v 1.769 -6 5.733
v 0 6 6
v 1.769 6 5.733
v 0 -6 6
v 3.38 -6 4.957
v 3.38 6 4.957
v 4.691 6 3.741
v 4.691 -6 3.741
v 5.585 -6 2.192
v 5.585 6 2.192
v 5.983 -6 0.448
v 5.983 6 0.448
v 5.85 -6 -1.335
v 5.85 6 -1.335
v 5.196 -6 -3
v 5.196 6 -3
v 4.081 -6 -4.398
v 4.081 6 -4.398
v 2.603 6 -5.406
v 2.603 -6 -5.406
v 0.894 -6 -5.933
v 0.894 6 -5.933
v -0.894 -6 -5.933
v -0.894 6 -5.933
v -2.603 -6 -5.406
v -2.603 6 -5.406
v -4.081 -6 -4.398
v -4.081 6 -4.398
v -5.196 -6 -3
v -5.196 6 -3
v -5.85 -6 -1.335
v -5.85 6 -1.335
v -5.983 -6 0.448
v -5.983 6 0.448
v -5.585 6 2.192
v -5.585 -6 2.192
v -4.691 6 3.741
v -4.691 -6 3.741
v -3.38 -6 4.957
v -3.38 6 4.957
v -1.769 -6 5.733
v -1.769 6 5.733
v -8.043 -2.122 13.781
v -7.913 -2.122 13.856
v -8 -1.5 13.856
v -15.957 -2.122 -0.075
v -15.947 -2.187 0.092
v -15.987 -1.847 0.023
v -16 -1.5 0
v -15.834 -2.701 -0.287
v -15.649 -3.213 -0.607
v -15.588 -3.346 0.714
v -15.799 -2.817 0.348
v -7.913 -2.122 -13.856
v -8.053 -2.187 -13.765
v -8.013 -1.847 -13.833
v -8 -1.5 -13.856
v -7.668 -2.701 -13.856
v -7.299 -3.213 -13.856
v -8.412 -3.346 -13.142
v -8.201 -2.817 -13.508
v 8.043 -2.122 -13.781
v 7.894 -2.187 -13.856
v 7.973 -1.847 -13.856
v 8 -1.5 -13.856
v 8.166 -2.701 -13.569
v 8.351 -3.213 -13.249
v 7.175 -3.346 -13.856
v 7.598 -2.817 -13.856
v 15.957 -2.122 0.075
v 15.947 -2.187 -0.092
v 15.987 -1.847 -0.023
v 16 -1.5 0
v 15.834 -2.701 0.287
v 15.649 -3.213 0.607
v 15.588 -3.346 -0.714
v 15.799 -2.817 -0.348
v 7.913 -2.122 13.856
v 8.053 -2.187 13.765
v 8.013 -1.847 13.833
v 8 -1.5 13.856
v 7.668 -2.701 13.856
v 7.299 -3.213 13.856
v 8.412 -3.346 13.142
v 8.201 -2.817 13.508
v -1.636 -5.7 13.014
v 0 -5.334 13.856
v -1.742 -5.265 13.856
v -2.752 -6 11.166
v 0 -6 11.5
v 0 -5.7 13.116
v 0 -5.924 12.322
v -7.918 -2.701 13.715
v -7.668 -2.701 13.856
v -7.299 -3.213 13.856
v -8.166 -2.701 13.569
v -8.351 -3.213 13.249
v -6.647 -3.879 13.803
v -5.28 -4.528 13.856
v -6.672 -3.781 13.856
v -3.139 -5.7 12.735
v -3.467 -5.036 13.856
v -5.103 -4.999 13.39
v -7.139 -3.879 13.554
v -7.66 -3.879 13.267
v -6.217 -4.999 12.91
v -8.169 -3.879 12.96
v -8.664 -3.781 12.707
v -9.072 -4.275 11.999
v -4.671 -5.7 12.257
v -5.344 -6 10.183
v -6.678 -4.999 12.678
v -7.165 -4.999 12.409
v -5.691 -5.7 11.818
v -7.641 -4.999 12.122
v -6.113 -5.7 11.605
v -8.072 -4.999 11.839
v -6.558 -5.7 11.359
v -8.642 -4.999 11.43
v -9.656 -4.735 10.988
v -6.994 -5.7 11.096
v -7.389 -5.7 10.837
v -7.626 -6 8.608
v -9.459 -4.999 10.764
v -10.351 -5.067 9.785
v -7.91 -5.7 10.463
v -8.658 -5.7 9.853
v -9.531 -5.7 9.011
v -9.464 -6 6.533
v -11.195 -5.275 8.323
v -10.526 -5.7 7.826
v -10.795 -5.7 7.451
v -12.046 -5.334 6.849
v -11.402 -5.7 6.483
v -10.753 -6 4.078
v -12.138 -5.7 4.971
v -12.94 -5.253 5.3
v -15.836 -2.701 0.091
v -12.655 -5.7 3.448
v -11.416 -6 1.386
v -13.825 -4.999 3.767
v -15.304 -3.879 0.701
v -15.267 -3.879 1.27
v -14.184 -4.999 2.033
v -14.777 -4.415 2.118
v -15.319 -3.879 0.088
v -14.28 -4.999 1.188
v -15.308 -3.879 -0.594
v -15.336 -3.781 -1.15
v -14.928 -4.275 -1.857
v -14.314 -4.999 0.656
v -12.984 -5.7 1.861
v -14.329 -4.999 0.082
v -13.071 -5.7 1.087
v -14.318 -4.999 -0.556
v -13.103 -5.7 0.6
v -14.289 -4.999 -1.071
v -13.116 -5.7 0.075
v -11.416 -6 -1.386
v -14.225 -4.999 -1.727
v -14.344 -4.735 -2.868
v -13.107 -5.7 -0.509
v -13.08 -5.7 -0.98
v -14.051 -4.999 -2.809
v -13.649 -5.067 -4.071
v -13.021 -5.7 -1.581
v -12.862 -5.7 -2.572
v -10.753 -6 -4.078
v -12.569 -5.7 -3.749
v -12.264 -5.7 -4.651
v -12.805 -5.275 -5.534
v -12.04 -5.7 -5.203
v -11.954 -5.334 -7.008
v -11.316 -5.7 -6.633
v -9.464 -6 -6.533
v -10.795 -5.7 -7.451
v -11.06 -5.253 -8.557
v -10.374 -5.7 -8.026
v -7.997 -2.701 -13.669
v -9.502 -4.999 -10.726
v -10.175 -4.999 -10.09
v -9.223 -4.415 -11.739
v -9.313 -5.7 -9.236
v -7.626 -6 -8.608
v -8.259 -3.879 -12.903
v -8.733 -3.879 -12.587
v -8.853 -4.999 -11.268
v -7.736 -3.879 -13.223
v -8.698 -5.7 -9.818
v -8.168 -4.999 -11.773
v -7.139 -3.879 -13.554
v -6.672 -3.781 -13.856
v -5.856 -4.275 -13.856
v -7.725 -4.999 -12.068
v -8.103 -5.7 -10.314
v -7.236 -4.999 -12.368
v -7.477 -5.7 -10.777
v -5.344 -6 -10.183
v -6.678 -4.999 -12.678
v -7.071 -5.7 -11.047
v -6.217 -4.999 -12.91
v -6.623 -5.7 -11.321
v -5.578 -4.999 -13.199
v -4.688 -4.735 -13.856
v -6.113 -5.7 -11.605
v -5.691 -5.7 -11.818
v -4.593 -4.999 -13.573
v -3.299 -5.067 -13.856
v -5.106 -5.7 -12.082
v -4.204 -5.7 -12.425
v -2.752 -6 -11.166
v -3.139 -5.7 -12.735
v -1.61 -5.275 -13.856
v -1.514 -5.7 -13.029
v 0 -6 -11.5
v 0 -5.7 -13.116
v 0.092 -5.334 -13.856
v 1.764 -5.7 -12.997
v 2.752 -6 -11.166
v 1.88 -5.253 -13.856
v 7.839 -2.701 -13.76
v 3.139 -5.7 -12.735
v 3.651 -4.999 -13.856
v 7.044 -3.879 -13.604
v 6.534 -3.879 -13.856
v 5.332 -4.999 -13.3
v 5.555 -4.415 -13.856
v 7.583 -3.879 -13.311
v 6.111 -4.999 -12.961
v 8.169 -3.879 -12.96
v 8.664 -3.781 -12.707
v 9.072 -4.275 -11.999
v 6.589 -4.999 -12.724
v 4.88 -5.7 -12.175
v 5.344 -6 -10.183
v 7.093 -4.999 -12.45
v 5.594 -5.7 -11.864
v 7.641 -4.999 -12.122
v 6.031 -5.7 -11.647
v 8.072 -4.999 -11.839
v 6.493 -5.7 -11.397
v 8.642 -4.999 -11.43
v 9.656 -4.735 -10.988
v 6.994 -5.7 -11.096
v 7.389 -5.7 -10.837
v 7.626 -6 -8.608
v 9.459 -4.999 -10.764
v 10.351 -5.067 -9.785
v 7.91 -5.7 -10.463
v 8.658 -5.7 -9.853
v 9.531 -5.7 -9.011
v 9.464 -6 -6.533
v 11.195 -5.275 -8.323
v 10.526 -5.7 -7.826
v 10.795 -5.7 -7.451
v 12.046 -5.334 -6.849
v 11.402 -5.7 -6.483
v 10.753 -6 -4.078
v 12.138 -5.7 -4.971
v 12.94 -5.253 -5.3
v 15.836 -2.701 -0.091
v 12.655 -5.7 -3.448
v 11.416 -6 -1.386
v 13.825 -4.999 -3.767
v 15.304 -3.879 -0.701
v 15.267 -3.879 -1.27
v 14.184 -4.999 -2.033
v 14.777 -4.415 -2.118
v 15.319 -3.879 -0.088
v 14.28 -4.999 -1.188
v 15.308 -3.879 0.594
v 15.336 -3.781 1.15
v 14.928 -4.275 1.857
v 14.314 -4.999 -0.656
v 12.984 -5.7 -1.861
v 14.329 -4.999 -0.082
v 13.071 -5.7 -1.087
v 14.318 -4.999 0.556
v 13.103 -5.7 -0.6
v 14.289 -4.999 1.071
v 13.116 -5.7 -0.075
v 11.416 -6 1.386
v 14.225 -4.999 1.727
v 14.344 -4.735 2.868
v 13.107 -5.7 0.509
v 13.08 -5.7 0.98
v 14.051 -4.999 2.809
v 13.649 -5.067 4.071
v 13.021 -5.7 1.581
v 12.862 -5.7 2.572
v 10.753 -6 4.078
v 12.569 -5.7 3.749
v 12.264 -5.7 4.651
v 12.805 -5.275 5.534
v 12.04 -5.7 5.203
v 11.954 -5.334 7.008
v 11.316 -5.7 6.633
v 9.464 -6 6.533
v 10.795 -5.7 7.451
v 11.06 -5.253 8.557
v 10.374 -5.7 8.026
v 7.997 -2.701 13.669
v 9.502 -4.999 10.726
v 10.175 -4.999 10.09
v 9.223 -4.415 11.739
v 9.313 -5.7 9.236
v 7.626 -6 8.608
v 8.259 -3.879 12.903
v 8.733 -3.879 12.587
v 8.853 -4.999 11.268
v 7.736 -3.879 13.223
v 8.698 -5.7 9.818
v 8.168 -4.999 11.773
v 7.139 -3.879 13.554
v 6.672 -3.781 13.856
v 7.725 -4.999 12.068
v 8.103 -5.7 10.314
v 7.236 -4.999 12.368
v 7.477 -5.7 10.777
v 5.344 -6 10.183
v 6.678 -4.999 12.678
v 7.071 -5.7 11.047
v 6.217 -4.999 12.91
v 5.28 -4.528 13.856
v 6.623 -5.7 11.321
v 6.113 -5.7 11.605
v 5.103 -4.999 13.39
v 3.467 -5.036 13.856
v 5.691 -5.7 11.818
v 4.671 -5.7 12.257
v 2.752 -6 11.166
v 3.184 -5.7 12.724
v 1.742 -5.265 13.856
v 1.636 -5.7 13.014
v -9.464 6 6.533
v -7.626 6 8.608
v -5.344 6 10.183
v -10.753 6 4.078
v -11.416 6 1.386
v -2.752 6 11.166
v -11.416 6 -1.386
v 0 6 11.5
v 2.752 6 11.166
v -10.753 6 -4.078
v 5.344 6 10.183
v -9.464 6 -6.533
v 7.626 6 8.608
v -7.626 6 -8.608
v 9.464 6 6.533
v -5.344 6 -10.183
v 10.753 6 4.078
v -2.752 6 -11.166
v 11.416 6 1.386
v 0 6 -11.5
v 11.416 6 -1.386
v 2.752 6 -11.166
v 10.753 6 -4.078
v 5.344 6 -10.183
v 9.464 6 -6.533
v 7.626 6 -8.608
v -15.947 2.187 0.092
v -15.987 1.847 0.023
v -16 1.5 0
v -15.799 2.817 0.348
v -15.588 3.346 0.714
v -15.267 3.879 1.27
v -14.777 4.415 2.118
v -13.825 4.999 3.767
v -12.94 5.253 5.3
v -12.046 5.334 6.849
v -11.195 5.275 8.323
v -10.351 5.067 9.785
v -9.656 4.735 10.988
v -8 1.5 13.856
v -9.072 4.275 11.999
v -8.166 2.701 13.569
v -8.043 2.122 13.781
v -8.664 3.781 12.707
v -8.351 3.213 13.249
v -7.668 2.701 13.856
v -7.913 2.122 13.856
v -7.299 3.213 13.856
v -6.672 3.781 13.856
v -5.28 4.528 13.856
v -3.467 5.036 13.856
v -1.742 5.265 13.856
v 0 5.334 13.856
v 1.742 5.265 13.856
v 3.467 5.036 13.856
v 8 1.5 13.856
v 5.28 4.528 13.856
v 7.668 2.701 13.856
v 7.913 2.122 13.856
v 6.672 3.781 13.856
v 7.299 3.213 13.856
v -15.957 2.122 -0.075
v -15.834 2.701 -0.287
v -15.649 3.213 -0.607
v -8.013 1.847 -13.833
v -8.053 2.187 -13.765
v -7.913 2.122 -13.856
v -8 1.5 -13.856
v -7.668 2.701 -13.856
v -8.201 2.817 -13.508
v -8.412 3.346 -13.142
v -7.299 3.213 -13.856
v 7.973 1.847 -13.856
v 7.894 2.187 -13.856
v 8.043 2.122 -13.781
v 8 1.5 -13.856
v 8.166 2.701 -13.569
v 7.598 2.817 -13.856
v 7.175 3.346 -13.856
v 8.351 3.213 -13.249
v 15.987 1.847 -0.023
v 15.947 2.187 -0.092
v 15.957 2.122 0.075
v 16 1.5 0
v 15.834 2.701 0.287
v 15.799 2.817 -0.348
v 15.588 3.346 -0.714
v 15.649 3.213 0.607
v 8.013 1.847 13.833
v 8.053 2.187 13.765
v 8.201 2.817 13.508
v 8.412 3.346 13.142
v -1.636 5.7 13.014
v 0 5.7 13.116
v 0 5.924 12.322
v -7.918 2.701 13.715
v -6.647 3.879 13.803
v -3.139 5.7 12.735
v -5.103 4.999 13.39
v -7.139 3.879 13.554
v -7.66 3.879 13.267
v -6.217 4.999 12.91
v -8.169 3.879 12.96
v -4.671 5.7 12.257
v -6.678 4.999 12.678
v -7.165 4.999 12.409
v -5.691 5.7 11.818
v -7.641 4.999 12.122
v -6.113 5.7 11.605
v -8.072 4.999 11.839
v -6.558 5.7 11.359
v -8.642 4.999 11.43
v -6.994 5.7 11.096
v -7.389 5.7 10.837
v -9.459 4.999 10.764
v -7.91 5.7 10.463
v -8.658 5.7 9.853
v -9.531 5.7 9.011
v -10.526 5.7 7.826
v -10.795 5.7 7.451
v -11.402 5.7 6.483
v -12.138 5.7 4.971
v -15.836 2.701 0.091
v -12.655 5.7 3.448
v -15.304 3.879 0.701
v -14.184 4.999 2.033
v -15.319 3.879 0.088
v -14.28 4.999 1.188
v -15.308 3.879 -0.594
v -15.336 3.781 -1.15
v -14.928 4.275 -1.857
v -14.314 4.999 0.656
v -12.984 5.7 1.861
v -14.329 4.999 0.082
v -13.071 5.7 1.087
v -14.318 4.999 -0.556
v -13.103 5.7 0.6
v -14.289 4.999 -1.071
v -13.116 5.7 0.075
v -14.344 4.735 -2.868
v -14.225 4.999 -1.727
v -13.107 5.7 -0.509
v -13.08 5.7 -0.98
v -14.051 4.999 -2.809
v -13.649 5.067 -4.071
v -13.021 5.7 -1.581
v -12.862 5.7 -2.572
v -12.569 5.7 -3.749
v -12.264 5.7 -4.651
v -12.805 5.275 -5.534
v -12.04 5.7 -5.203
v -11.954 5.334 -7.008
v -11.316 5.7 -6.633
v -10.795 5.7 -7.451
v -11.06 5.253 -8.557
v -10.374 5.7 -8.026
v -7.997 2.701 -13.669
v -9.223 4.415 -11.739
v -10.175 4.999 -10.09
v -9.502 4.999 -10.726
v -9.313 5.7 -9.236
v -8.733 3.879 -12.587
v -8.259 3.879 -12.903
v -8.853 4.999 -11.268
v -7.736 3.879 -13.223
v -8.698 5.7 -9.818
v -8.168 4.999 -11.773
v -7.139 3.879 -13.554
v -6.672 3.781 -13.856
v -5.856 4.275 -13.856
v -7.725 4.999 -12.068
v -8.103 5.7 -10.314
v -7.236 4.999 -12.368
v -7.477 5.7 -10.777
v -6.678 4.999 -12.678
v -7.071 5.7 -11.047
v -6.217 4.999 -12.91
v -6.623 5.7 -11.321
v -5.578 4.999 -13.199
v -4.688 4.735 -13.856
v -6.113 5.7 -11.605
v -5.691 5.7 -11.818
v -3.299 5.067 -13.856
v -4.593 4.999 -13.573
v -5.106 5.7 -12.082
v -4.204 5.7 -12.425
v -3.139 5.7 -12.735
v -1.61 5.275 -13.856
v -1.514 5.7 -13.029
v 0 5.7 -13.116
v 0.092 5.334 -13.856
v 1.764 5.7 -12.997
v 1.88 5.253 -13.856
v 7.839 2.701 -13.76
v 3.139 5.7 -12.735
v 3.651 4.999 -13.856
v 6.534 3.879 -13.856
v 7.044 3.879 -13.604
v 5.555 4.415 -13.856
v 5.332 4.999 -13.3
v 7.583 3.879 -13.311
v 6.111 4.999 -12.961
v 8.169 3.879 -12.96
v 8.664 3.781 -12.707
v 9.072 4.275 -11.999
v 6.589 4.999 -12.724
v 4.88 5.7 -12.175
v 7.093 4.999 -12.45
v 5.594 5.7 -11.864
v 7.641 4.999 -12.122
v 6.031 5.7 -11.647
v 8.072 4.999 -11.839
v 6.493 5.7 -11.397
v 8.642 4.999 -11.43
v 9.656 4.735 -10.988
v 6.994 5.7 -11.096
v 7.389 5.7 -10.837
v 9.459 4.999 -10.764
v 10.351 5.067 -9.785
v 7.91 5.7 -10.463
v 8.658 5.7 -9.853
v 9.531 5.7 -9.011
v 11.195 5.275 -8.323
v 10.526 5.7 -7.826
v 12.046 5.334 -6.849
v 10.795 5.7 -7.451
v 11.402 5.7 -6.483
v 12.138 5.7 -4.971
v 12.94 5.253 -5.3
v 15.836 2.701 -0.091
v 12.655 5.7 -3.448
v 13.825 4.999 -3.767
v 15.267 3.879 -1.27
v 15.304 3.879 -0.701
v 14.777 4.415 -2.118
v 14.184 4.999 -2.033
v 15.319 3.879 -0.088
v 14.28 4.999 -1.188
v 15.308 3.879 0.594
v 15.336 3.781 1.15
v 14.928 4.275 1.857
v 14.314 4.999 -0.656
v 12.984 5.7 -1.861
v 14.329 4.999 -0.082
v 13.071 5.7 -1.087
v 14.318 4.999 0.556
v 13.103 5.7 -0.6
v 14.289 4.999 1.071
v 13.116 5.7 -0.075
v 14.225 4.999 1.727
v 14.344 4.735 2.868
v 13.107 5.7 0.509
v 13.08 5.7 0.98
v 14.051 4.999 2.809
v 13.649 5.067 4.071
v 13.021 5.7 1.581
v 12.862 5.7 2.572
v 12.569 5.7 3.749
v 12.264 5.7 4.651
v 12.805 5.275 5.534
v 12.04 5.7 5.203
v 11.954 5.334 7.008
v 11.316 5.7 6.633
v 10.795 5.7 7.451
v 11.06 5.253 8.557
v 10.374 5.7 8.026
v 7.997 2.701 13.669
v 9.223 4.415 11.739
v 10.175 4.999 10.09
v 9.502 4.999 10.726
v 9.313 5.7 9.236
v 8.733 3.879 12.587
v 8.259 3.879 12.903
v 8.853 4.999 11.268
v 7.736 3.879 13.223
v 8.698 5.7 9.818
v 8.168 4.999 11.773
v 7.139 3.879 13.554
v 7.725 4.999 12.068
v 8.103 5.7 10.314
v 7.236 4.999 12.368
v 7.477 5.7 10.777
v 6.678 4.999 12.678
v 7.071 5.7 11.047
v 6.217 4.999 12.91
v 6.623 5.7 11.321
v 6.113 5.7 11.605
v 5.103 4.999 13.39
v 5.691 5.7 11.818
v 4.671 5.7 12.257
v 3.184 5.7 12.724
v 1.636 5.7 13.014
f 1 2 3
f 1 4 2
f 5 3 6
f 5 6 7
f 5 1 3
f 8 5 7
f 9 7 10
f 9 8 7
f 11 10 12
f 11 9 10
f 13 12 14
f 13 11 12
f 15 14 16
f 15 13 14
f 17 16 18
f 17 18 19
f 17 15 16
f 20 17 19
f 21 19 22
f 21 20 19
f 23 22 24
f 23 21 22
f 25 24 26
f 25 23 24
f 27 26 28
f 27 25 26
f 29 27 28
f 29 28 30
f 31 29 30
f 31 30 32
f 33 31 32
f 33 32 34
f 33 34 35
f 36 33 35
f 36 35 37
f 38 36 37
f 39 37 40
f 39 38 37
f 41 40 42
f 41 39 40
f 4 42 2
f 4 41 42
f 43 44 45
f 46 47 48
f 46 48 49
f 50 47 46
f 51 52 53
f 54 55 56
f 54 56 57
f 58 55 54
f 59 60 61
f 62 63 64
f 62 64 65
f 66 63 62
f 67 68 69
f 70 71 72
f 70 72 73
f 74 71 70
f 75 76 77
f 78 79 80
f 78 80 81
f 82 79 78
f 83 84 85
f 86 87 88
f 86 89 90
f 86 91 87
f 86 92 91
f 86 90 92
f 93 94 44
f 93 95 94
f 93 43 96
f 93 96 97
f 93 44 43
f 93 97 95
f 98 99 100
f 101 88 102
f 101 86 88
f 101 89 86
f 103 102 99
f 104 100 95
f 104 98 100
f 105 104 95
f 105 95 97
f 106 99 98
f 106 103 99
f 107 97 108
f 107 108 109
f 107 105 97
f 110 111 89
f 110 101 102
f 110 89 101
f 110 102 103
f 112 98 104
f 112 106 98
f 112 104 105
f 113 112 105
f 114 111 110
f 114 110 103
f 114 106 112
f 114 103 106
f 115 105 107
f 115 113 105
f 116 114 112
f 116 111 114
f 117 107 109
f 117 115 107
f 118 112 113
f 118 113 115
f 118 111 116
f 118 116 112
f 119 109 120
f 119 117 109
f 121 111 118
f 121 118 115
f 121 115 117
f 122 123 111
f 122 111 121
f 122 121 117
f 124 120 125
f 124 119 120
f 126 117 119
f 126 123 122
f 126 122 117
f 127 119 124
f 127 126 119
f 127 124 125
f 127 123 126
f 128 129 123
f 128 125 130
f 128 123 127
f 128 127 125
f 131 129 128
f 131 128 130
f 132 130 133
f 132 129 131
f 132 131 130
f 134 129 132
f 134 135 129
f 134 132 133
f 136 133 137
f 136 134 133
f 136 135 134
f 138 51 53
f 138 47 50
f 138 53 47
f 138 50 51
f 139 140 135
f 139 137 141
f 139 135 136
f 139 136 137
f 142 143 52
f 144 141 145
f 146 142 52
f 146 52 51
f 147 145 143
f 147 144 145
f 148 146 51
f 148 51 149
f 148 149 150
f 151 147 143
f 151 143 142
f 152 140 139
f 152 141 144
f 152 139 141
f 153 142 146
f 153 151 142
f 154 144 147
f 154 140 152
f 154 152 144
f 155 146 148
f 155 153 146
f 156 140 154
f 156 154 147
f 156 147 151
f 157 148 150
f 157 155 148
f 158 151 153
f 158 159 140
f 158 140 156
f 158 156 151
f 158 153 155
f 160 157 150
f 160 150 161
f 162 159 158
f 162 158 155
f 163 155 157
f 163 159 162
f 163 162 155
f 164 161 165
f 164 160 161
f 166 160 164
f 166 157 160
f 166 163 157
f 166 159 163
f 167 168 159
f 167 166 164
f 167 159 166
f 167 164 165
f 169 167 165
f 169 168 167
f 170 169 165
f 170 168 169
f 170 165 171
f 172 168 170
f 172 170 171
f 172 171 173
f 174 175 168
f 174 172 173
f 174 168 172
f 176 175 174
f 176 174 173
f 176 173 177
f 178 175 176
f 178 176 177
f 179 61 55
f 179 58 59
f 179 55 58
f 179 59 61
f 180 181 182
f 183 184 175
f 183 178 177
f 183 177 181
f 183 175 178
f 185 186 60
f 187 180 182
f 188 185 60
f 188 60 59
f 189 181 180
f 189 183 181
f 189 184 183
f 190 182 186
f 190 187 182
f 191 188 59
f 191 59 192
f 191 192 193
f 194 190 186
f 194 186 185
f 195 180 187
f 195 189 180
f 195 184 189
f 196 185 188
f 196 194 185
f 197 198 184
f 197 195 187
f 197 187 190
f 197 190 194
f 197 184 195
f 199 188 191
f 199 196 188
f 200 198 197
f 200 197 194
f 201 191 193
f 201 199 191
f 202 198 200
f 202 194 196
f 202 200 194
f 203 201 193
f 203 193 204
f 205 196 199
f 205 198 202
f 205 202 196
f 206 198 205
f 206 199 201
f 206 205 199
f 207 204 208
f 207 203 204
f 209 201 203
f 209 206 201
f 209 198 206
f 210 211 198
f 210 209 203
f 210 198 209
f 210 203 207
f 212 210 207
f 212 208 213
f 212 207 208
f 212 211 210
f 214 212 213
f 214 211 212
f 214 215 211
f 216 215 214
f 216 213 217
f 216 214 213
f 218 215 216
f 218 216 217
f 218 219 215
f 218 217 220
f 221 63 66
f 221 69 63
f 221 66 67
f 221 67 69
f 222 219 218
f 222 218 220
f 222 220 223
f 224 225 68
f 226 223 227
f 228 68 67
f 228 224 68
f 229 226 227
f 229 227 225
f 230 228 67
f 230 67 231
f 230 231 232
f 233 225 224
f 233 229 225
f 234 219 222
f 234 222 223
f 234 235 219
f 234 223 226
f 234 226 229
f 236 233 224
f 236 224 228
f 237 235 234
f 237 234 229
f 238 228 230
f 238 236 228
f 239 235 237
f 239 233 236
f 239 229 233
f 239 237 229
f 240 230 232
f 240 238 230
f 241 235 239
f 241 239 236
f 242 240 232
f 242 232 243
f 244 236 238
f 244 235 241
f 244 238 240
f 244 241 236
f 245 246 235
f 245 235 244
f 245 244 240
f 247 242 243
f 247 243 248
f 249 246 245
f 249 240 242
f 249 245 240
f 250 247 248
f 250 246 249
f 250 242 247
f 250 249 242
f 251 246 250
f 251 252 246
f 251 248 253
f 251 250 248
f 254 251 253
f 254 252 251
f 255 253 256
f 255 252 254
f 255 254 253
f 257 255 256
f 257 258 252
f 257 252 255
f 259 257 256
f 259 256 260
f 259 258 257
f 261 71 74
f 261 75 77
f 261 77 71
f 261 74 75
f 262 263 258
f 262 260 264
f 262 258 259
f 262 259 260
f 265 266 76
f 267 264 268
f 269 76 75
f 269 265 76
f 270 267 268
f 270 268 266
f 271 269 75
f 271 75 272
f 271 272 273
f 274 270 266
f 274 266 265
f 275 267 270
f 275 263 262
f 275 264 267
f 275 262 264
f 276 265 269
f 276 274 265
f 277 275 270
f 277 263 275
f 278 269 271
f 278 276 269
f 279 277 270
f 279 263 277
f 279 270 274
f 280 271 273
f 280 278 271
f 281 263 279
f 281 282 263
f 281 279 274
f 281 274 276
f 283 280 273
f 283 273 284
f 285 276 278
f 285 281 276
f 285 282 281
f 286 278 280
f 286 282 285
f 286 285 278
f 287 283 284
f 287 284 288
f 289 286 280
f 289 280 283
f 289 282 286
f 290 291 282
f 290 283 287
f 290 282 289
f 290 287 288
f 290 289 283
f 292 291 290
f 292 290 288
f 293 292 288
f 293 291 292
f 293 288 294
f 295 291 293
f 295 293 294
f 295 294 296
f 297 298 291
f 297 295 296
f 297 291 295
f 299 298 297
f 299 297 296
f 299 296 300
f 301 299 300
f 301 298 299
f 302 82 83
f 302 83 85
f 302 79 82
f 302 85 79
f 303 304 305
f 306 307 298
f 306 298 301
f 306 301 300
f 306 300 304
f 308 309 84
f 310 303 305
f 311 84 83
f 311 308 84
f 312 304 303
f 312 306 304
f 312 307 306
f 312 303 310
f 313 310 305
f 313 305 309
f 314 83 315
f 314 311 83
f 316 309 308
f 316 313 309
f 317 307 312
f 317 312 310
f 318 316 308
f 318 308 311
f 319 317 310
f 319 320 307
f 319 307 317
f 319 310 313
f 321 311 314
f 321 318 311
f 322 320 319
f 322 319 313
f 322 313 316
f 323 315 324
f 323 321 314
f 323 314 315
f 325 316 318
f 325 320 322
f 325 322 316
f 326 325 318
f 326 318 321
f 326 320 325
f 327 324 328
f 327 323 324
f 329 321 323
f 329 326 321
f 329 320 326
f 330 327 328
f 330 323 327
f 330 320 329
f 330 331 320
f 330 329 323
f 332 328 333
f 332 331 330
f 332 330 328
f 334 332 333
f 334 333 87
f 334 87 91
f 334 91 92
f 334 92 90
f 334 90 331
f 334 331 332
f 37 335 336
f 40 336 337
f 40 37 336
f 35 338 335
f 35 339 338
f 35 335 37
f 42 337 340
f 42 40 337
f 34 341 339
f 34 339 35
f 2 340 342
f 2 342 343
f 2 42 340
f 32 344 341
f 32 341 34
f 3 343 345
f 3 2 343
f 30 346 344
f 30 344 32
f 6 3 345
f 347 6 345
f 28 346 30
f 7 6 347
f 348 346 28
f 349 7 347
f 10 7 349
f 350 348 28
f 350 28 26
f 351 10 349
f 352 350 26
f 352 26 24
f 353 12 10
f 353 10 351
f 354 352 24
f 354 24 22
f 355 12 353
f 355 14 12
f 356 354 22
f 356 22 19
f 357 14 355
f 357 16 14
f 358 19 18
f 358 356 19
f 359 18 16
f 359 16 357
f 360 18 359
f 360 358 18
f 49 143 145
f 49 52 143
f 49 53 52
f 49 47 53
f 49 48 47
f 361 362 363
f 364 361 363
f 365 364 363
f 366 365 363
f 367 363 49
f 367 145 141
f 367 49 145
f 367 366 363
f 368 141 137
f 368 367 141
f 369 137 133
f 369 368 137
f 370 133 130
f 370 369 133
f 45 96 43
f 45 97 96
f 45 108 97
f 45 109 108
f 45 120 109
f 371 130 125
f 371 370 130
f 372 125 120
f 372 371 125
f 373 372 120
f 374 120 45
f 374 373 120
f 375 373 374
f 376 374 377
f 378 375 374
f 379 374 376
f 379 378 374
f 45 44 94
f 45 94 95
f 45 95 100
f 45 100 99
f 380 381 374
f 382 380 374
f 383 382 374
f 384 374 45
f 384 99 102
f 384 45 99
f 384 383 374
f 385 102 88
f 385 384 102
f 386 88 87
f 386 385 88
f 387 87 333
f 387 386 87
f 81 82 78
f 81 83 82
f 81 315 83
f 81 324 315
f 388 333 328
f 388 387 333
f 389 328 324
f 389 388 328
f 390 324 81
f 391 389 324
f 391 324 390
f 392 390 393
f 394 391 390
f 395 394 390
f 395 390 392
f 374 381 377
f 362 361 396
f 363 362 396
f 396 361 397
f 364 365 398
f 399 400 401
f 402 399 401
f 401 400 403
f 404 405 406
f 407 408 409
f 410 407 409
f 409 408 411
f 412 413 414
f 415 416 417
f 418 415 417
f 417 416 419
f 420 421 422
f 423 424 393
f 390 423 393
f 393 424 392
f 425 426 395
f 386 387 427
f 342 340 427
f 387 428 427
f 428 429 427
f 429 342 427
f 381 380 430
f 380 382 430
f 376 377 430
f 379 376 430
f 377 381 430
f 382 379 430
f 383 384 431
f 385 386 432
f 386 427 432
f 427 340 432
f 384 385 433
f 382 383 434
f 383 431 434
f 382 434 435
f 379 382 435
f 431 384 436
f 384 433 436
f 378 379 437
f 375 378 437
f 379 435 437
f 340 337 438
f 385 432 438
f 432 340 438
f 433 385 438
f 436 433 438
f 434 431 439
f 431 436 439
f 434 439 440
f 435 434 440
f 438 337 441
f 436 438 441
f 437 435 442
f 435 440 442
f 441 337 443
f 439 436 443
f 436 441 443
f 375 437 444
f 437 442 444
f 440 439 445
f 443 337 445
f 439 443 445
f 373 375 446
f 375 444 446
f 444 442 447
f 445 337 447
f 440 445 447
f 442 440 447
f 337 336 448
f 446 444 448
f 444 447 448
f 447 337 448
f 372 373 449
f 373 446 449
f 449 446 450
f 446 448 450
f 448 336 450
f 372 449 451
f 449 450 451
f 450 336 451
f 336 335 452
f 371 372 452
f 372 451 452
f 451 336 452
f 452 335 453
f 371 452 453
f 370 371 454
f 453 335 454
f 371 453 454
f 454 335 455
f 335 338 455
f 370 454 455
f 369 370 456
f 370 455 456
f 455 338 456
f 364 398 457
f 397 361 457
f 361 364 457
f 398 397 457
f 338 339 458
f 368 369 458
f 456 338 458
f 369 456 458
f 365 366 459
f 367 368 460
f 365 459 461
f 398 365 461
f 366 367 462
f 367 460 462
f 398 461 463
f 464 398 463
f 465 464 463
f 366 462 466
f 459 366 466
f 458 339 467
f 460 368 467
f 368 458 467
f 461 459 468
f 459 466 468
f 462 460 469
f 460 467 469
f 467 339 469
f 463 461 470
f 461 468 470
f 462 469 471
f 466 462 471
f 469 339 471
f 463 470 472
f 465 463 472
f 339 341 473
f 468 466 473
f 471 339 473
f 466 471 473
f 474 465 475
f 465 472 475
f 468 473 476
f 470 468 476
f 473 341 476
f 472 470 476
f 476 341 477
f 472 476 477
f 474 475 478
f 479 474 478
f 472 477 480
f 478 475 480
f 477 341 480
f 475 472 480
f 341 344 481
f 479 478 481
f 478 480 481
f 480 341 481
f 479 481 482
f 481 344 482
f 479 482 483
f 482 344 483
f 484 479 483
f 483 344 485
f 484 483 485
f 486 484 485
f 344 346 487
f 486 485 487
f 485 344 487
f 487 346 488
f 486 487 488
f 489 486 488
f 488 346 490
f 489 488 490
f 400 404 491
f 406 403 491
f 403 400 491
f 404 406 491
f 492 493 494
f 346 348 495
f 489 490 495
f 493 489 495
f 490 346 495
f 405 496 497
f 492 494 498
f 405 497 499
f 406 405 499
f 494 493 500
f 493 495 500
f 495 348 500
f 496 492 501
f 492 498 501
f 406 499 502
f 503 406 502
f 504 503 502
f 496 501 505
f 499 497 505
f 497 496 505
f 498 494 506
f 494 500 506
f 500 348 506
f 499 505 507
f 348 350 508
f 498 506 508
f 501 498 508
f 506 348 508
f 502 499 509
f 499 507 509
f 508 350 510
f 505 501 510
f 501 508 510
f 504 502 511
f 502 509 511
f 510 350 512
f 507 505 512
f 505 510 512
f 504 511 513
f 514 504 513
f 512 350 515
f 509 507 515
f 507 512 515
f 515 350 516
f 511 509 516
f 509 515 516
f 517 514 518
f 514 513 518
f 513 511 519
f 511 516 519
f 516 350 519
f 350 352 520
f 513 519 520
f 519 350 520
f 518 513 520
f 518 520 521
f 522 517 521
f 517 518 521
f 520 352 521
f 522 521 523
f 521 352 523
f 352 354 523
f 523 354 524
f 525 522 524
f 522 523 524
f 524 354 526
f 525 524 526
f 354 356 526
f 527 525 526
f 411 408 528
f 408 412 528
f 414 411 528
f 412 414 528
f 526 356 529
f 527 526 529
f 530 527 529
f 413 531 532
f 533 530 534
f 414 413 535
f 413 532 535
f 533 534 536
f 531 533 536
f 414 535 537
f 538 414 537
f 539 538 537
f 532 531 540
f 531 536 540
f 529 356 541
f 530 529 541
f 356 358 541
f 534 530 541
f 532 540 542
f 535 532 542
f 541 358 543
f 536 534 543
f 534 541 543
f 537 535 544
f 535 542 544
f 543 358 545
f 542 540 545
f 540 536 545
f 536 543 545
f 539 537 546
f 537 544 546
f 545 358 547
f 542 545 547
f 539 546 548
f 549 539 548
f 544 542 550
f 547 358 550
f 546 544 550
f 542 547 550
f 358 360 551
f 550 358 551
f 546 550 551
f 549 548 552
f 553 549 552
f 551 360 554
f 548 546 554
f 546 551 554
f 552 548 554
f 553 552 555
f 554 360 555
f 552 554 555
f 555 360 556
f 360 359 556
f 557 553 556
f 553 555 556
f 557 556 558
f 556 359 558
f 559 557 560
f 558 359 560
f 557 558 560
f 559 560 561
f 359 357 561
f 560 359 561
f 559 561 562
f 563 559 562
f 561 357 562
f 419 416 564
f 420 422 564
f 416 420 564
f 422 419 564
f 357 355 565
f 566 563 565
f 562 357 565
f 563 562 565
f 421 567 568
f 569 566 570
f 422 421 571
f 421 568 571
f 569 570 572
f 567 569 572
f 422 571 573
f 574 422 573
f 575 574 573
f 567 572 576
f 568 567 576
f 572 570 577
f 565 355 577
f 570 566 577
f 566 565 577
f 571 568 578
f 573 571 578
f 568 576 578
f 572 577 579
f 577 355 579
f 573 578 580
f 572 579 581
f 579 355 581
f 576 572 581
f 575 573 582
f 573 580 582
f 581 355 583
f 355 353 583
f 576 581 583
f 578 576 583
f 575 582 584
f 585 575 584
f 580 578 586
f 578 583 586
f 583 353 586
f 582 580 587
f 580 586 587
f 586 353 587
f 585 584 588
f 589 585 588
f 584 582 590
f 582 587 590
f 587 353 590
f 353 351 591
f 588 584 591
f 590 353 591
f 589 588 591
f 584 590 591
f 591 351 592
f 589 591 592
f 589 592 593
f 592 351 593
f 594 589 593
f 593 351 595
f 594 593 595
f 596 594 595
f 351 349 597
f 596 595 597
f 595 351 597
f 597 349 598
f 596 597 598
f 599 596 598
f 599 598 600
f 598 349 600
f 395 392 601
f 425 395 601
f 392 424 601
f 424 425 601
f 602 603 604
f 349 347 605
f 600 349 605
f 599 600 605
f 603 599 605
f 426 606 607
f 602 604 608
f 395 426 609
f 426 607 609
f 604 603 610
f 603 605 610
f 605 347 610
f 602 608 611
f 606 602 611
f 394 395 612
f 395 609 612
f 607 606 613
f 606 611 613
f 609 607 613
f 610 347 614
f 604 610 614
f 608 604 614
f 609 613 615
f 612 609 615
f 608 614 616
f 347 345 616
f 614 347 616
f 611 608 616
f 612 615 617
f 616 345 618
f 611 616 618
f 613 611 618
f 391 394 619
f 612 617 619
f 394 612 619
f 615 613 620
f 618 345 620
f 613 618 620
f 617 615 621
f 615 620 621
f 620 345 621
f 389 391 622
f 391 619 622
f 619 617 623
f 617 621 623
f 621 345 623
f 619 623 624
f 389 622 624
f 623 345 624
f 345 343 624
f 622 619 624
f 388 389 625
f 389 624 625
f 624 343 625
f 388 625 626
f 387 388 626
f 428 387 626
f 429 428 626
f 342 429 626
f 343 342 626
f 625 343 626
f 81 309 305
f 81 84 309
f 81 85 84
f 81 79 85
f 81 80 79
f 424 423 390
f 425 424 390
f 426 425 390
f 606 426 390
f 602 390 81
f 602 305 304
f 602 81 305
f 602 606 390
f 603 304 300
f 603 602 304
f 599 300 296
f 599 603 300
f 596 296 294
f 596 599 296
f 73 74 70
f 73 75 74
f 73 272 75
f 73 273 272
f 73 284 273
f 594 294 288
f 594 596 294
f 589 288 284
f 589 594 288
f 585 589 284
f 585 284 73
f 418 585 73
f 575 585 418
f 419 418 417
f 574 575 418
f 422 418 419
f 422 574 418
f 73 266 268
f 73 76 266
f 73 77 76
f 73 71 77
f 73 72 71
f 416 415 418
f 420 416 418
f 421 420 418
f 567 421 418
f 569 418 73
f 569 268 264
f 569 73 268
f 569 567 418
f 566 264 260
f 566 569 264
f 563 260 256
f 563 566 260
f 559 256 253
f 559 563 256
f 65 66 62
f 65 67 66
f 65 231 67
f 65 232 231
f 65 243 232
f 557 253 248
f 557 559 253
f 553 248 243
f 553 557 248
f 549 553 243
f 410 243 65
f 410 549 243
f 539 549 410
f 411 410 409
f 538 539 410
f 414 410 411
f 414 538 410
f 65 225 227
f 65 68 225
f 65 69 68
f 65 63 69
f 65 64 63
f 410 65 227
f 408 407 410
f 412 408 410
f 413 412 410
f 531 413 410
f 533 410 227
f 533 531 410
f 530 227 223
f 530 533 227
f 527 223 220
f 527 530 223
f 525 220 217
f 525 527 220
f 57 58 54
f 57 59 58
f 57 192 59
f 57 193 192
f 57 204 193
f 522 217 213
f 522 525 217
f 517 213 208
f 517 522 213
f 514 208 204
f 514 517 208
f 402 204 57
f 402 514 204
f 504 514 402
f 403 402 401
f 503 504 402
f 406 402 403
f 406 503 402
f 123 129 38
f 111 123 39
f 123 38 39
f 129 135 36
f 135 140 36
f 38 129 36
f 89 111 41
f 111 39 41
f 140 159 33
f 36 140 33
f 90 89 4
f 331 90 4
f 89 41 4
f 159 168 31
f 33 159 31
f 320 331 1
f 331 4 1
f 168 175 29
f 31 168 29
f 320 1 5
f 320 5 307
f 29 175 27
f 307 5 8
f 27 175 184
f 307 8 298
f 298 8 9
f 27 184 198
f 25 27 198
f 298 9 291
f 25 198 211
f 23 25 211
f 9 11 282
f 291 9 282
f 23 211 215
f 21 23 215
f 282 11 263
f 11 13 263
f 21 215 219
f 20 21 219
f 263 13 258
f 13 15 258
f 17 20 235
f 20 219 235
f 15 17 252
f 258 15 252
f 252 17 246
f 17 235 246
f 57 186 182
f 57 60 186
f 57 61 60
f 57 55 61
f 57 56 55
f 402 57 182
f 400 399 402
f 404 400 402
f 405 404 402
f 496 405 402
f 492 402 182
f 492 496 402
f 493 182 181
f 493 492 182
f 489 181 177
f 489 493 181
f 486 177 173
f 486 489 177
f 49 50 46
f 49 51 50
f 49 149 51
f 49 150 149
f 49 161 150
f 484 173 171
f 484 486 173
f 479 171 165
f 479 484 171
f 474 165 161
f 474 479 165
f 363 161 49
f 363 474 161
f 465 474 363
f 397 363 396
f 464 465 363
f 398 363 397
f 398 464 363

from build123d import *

# Parameters (mm, degrees)
SKETCH1_R           = 6
BOSS_EXTRUDE1_DEPTH = 6


with BuildPart() as part:
    # Sketch1 → Boss-Extrude1 (new, symmetric)
    with BuildSketch(Plane(origin=(0, 0, 0), x_dir=(1, 0, 0), z_dir=(0, 1, 0))):
        Polygon((16, 0), (8, 13.856406461), (-8, 13.856406461), (-16, 0), (-8, -13.856406461), (8, -13.856406461), align=None)
        with Locations(Location((0, 0, 0), (0, 0, 270))):
            Circle(SKETCH1_R, mode=Mode.SUBTRACT)
    extrude(amount=BOSS_EXTRUDE1_DEPTH, both=True)

    # Sketch2 → Cut-Revolve2 (revolve, cut)
    with BuildSketch(Plane.XY, mode=Mode.PRIVATE) as cut_revolve2_sk:
        with BuildLine():
            Line((11.5, 6), (16, 6))
            Line((16, 6), (16, 1.5))
            ThreePointArc((16, 1.5), (14.681980515, 4.681980515), (11.5, 6))
        make_face()
        with BuildLine():
            Line((11.5, -6), (16, -6))
            Line((16, -6), (16, -1.5))
            ThreePointArc((16, -1.5), (14.681980515, -4.681980515), (11.5, -6))
        make_face()
    revolve(cut_revolve2_sk.sketch.rotate(Axis((0, 9.943732914, 0), (0, -1, 0)), 90), axis=Axis((0, 9.943732914, 0), (0, -1, 0)), mode=Mode.SUBTRACT)


solid = part.part
